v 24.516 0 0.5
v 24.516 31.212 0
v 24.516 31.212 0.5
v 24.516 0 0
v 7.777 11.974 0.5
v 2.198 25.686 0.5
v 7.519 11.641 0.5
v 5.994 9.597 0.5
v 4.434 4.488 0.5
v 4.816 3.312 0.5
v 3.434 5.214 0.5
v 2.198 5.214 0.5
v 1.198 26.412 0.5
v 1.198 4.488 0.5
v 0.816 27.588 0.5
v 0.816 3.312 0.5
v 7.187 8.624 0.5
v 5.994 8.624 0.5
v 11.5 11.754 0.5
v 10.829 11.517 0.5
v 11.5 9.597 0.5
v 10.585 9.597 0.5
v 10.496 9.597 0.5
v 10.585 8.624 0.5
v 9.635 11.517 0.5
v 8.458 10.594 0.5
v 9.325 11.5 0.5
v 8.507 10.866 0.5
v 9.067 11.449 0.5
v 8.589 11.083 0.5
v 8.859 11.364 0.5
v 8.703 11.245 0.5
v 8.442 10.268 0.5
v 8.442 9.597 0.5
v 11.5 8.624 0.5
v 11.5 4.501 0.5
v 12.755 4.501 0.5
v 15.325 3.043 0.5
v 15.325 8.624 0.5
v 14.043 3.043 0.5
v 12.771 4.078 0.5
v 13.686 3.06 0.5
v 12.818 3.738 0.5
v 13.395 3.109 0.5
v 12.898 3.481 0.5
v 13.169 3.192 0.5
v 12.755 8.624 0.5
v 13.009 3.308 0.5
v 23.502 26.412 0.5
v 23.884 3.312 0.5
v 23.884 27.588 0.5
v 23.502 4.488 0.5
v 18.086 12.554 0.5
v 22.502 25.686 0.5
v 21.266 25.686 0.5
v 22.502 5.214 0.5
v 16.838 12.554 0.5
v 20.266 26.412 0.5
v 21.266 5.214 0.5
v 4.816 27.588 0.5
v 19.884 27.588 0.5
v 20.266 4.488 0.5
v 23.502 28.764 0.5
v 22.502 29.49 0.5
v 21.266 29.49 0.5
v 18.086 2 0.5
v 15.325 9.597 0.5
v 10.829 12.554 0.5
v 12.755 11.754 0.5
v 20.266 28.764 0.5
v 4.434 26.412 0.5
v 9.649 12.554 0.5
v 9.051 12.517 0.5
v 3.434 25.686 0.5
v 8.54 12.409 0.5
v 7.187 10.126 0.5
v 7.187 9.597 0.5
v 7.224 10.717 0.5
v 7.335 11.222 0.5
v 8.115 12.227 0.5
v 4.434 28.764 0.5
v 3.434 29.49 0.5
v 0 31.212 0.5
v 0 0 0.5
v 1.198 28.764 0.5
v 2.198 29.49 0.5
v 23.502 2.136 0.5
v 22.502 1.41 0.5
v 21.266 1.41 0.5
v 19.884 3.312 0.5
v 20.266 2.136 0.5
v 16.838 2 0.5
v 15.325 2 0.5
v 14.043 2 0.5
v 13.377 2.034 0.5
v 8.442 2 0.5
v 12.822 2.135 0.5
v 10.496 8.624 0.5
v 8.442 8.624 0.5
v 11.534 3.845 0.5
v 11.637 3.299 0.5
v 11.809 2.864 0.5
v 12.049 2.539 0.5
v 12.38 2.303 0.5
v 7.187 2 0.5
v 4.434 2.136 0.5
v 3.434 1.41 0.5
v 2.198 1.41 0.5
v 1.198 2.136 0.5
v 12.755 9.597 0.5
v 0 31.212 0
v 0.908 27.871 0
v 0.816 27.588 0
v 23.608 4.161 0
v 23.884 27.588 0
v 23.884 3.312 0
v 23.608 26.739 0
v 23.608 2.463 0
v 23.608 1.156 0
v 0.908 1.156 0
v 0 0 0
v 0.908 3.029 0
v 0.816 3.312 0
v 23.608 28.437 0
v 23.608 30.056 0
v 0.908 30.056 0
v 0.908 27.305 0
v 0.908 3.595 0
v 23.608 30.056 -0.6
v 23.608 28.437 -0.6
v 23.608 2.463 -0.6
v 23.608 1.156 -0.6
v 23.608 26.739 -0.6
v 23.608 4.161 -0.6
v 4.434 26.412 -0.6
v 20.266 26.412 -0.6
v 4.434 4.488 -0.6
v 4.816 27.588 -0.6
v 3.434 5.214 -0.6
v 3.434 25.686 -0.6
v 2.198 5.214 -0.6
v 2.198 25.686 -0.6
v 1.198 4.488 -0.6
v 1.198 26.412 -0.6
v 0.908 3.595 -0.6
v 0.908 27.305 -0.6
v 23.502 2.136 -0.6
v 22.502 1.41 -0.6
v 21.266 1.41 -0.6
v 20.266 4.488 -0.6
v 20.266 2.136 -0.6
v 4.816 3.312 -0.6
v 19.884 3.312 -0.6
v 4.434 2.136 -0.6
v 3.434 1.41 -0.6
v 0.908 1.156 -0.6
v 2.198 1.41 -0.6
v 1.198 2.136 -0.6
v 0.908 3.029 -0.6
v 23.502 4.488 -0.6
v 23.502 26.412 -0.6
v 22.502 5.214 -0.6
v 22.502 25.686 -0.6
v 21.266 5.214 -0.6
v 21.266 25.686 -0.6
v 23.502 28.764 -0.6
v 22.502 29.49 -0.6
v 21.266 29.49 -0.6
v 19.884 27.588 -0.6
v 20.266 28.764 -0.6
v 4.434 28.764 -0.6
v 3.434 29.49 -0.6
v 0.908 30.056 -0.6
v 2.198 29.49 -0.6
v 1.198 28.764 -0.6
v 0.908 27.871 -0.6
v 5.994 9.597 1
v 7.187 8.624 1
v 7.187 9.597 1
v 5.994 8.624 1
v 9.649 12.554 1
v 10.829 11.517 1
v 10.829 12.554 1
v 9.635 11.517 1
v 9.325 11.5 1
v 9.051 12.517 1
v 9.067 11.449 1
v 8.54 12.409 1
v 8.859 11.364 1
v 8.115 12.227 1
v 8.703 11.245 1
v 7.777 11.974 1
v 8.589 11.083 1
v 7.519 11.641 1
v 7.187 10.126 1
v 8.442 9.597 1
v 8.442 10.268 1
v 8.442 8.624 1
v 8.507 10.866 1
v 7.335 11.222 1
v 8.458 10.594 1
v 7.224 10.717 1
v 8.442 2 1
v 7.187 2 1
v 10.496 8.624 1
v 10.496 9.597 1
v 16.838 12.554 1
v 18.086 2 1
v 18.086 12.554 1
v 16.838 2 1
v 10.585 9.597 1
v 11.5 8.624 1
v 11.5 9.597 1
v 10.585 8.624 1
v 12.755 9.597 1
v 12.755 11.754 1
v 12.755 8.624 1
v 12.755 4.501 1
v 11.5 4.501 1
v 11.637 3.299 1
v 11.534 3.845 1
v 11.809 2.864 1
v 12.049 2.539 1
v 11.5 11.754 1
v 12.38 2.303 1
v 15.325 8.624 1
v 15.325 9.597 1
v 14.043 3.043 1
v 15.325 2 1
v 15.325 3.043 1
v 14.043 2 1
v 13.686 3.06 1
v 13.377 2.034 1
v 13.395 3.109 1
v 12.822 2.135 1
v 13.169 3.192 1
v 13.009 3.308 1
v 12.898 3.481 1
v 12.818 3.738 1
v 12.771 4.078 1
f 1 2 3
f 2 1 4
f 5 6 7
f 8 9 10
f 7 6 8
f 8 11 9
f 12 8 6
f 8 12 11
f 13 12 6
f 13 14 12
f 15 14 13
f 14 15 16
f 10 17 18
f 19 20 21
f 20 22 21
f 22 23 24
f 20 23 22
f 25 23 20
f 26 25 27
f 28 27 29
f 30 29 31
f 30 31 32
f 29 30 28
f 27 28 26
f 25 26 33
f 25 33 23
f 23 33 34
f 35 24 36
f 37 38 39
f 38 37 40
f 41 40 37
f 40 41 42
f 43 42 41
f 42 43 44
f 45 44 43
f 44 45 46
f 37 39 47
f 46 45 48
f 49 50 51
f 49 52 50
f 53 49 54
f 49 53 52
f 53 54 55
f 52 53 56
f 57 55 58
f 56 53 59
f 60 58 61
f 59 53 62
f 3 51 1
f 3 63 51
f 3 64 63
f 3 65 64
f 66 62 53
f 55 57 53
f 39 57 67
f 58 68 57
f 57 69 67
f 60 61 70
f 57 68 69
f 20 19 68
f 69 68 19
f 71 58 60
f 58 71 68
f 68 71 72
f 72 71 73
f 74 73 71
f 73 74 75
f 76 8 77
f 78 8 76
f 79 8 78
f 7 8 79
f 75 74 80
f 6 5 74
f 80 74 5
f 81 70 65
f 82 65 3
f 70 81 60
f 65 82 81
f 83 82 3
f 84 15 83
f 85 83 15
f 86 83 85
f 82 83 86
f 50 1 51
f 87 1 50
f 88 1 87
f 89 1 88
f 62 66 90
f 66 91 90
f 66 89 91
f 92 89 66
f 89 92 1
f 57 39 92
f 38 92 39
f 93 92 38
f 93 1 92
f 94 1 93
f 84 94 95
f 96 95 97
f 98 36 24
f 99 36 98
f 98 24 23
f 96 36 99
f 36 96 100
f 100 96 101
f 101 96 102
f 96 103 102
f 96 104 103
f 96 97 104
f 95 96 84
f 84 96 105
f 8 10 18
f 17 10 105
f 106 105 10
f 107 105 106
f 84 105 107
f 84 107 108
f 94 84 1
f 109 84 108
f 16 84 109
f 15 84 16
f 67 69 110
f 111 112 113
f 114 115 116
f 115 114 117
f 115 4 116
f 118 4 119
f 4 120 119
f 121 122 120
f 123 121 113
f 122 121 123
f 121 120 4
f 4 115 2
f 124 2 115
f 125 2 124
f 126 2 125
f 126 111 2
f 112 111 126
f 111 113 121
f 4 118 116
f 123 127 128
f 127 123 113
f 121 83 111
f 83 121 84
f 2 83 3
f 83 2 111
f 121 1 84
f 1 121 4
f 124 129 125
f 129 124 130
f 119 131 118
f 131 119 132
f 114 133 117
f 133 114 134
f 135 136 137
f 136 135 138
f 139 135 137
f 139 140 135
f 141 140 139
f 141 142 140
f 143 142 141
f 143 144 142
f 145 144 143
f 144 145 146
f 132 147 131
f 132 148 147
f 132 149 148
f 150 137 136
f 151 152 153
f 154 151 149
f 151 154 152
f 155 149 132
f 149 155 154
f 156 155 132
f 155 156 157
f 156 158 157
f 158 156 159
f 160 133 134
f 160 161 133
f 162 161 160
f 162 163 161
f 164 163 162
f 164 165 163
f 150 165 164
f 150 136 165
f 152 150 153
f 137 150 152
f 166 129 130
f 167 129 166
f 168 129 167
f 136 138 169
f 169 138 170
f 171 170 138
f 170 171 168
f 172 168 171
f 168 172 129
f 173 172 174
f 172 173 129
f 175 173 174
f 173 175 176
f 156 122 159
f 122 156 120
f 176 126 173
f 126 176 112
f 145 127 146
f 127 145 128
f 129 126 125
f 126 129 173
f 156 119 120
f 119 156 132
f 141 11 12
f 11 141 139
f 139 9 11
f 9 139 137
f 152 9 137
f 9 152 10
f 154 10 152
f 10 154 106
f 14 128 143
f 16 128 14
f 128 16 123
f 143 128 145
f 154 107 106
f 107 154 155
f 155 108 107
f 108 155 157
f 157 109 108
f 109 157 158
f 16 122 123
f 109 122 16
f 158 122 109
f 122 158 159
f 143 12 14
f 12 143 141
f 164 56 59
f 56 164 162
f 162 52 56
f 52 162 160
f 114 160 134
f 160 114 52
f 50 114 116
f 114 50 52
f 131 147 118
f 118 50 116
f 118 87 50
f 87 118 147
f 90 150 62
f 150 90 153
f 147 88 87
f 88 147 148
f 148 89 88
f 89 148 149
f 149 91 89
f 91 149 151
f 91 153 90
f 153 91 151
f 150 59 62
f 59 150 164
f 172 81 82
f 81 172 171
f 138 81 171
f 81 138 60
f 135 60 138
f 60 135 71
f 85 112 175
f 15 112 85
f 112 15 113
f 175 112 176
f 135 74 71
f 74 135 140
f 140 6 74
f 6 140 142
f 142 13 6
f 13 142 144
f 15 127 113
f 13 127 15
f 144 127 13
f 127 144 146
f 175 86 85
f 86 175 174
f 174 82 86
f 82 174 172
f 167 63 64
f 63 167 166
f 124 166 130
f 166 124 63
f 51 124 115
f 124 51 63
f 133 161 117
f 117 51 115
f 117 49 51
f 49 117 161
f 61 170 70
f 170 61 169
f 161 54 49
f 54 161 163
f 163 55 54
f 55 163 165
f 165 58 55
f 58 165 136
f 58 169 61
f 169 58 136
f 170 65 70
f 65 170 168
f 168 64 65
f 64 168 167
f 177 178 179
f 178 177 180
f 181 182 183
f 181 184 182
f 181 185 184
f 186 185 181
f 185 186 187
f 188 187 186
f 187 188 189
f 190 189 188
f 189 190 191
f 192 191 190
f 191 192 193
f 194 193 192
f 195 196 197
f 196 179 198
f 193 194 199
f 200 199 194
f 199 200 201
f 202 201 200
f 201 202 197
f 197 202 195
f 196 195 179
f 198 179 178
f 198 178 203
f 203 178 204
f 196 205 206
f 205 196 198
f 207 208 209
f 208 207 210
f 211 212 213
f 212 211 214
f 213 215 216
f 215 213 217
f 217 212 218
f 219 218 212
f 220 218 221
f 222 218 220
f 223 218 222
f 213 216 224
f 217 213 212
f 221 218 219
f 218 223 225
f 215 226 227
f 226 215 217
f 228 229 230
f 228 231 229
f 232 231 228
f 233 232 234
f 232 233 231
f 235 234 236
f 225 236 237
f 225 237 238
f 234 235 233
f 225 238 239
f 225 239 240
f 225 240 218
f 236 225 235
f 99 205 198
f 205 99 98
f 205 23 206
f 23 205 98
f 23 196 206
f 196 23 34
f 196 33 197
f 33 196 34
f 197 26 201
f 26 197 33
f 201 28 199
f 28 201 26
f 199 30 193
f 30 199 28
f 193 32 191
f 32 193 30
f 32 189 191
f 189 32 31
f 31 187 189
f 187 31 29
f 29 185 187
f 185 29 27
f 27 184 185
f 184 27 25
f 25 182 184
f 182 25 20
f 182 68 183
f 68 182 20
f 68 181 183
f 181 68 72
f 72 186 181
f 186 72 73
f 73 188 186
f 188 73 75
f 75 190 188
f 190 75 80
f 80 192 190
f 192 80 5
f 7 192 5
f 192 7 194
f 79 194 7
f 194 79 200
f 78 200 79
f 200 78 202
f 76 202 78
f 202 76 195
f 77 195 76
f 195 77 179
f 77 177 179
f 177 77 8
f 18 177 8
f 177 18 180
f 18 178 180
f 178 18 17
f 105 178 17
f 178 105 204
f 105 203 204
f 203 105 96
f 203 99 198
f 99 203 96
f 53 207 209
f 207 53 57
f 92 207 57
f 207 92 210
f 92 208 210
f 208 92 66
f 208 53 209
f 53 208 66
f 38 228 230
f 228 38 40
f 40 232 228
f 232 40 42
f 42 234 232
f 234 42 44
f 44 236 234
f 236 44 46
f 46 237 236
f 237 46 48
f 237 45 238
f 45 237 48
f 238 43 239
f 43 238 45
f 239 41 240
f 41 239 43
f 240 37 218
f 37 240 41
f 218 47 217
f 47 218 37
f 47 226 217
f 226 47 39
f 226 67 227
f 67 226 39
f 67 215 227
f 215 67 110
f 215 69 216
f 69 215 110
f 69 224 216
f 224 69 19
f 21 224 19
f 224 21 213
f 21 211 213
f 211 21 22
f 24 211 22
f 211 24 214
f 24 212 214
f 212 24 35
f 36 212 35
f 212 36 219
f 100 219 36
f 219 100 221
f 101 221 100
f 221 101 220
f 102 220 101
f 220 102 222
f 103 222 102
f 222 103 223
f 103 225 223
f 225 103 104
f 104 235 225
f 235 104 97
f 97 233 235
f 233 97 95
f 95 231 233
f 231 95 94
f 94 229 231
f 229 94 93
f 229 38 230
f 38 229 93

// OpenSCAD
//21.55x28.01
w=22.7;
h=28.9;
z=0.5;
rim=0.08;
text="ftl";
fontsize=10;

difference() {
 union() {
  cube([w*(1+rim),h*(1+rim),z]);
  translate([w*rim/2,h*rim/2,-0.6]){
   cube([w,h,z*2]);
  }    
 }
 
 // screwholes
 screw_r=2;
 screw_h=4;
 translate([w*(rim)+(screw_r/2),h*rim+(screw_r/2),-1]) {
     cylinder(h=screw_h, r=screw_r, $fn=10);
 }
 translate([w*(1-rim)+(screw_r/2),h*rim+(screw_r/2),-1]) {
     cylinder(h=screw_h, r=screw_r, $fn=10);
 }
 translate([w*(rim)+(screw_r/2),h*(1-rim)+(screw_r/2),-1]) {
     cylinder(h=screw_h, r=screw_r, $fn=10);
 }
 translate([w*(1-rim)+(screw_r/2),h*(1-rim)+(screw_r/2),-1]) {
     cylinder(h=screw_h, r=screw_r, $fn=10);
 }

 
}

// text
translate([w*0.25,2,0]) {
    linear_extrude(height = 1) {
      text(text, size = fontsize, font = "Verdana");
    }
}
